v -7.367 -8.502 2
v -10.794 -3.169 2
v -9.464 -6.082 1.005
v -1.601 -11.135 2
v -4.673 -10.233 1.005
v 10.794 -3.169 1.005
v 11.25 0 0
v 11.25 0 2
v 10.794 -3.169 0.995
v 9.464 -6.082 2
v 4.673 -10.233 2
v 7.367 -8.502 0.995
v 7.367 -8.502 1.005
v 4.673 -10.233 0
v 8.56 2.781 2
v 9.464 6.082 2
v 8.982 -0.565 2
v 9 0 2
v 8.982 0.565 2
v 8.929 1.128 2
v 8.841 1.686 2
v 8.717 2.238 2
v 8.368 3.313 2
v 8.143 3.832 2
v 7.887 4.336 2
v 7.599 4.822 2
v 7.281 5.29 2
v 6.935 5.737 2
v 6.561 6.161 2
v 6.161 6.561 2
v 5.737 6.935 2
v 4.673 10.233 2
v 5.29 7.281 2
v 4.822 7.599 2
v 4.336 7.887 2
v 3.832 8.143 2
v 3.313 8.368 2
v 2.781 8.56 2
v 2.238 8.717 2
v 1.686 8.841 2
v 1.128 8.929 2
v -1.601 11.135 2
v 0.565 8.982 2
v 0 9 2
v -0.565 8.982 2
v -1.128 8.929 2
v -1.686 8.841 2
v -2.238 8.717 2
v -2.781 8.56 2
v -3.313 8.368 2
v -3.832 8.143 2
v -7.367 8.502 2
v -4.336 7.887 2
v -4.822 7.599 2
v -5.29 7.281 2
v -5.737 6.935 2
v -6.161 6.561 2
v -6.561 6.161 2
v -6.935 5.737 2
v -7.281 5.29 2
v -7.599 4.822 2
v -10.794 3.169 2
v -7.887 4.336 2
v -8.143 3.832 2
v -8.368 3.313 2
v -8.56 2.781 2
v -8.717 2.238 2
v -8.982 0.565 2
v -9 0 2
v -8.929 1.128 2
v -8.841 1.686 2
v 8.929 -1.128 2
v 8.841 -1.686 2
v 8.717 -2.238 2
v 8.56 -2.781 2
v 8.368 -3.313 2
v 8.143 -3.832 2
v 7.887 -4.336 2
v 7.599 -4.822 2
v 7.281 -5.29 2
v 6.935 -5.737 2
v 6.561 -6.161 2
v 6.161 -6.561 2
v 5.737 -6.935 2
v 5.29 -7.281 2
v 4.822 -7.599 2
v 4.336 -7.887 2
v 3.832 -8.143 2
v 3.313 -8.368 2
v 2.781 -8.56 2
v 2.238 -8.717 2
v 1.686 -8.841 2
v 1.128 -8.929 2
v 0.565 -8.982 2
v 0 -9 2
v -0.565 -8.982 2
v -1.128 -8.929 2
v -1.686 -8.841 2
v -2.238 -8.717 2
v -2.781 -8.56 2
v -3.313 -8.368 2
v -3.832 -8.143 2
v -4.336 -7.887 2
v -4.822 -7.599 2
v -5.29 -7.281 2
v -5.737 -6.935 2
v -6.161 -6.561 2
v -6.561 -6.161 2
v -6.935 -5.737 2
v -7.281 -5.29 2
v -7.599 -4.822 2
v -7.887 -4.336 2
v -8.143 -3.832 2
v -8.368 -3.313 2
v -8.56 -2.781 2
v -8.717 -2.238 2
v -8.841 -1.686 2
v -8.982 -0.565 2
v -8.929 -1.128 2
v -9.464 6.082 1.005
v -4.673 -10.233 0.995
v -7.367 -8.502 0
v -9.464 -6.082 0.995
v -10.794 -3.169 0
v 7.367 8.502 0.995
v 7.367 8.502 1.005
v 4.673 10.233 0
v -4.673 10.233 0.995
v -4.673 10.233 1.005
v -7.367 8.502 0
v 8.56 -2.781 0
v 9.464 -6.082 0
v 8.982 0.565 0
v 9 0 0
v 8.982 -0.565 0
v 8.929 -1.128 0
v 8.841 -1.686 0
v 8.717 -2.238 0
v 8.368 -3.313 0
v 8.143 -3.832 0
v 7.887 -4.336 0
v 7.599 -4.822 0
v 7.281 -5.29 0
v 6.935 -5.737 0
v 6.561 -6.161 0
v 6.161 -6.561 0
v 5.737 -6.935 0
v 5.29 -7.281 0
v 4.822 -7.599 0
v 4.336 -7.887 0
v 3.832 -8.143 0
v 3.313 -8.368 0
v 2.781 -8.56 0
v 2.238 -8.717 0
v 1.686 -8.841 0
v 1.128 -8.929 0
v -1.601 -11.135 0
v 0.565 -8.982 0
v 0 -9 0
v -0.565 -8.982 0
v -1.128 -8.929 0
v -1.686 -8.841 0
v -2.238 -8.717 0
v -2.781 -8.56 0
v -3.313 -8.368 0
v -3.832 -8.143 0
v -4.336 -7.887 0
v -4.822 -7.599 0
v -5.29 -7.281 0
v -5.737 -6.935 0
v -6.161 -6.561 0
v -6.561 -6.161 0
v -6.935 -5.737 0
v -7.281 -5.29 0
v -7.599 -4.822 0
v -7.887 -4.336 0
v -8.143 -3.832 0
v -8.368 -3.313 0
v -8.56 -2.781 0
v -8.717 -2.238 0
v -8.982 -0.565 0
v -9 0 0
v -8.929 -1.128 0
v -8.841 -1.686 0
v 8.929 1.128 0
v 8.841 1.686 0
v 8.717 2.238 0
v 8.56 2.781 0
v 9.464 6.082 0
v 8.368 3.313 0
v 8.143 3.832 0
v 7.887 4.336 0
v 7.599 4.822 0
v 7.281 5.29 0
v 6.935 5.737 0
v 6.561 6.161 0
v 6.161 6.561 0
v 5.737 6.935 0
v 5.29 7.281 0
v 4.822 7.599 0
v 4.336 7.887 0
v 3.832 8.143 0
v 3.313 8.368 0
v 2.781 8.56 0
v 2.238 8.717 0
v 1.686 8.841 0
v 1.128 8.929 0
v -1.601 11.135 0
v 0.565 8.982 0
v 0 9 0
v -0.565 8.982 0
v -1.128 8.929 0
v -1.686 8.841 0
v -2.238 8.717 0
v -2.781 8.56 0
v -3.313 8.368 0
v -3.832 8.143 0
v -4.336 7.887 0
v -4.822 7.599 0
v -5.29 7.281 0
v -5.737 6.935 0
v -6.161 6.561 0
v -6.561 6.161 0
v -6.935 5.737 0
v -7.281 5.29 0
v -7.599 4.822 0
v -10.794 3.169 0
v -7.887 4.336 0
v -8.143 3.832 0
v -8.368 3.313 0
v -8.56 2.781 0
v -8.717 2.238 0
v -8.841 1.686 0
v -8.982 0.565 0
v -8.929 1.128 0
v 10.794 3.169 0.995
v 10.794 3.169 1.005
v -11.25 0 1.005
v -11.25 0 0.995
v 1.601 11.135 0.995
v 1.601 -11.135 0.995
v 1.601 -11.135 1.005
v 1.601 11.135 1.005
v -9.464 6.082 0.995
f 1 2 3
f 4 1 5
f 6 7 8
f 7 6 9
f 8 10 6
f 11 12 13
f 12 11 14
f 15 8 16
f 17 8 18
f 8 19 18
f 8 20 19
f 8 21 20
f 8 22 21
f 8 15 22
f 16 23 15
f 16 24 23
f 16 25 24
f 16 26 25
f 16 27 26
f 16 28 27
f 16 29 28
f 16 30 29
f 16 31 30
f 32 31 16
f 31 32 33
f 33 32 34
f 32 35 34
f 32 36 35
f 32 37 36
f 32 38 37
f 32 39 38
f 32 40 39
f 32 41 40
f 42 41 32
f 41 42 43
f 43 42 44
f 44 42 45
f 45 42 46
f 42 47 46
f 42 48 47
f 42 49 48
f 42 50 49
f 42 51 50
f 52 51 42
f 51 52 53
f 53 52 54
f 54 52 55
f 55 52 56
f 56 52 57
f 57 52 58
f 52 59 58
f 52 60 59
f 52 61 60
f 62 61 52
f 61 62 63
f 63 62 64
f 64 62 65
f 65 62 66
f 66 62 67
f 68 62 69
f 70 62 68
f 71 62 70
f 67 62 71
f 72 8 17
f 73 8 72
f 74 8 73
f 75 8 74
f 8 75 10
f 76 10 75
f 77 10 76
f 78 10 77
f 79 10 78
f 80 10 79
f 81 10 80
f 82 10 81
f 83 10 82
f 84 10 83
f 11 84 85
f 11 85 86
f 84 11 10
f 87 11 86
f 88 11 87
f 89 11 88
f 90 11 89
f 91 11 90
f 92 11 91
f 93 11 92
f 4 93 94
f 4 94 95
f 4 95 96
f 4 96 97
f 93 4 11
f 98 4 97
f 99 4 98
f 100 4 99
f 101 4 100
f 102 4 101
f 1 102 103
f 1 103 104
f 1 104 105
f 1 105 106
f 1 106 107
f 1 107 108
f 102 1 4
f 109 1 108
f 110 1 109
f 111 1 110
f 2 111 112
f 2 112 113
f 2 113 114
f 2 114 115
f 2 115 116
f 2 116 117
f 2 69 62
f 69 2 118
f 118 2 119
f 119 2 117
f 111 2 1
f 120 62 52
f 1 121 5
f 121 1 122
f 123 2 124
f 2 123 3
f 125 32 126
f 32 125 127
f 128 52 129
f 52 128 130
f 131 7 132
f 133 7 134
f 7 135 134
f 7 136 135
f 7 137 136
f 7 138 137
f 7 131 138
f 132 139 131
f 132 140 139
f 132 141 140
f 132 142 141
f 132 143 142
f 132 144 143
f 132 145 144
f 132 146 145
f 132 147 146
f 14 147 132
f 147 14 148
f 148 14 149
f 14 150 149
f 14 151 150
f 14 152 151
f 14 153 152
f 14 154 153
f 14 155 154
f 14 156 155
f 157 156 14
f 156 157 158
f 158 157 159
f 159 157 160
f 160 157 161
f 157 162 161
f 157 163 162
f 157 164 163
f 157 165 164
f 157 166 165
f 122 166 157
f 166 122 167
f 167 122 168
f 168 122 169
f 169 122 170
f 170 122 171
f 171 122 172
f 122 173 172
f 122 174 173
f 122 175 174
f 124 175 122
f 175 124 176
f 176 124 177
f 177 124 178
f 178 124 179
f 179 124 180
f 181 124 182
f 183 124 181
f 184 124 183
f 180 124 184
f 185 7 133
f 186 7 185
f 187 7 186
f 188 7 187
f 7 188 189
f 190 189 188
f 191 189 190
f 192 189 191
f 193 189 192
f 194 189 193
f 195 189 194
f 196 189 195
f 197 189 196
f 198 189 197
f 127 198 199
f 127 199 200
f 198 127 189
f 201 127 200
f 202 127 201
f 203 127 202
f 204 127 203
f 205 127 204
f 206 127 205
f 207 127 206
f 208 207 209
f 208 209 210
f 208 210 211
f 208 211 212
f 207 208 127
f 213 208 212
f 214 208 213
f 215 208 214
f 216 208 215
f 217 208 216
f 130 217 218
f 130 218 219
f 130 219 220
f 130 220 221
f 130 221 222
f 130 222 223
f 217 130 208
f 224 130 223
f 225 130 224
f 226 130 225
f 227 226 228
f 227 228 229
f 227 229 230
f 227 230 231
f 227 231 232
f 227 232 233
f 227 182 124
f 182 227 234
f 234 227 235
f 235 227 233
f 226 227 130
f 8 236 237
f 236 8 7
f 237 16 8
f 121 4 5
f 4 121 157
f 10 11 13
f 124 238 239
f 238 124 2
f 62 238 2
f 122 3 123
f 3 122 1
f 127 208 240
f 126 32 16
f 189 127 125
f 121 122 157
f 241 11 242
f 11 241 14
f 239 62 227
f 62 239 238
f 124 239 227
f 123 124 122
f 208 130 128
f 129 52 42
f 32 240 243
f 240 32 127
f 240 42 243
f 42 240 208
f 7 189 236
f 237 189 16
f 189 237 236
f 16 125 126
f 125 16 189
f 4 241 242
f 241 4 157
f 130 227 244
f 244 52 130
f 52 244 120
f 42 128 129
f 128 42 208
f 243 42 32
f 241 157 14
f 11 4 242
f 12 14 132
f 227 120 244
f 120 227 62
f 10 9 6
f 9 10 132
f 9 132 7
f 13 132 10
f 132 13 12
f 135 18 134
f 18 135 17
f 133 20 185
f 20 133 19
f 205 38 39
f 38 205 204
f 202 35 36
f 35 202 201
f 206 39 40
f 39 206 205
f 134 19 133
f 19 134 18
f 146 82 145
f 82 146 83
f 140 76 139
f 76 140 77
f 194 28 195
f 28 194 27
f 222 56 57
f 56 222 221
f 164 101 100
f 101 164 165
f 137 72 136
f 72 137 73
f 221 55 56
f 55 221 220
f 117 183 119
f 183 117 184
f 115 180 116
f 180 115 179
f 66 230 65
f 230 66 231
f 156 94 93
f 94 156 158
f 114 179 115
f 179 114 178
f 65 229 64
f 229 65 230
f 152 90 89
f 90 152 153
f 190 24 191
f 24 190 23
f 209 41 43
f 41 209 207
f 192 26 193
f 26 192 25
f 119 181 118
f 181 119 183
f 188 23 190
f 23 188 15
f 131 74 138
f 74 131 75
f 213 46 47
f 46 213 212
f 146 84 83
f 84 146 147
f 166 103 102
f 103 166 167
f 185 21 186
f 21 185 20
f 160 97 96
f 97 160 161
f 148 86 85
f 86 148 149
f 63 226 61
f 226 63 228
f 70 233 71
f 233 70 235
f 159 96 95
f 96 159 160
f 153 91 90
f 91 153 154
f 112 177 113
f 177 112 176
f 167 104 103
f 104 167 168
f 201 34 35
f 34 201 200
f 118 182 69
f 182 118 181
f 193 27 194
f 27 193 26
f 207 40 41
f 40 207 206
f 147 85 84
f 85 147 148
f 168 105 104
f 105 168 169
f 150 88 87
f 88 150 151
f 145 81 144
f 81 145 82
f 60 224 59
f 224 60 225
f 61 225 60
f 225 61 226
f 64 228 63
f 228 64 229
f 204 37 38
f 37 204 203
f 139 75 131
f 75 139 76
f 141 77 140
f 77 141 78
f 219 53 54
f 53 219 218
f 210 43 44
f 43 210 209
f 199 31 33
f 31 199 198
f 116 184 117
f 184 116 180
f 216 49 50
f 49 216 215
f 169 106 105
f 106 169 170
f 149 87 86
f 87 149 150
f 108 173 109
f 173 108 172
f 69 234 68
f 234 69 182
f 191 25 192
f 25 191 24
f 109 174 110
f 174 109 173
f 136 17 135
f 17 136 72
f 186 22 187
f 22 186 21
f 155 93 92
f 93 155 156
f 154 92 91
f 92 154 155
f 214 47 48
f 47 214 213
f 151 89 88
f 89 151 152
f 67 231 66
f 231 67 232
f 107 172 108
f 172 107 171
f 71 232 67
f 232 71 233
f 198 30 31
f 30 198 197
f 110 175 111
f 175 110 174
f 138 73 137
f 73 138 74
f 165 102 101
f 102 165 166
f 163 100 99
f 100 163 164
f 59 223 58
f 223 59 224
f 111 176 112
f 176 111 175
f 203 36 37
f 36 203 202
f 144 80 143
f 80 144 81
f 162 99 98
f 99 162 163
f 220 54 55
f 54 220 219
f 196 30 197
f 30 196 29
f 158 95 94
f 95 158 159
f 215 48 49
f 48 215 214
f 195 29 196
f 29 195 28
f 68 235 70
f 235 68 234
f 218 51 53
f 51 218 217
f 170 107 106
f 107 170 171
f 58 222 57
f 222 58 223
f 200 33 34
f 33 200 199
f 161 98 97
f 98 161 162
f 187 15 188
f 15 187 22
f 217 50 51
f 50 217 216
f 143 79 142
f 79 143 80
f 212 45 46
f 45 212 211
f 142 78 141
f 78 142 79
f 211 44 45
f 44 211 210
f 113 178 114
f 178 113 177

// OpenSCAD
// your finger measurement
inner_diameter = 18;
inner_radius = inner_diameter / 2;

// how much bigger should the outside be?
//
// useful values: +10% .. +20% 
//
// (inversely proportionate to the facets: facets = 6 --> 20%, facets = 24 --> 10%)
radius = inner_radius * 1.25;

// the total number of similar rows that the ring should consist of
//
// useful values: 1 ... 5
number_of_rows = 1;

// the height of each layer
//
// useful values: 1 ... 5
height = 2;

// how many points thingies around the ring do you want?
//
// useful values: 6 .. 12 .. 24
facets = 11;

// height of the middle layer... 
// nearly zero results in a single diamond shape
// a value closer to one third of the height gives a nice segmented look
//
// useful values: 0.01 ... 0.2*height ... 0.8*height
middle_height = 0.01;//*height;
//middle_height = 0.3*height;

// make the pointy thingies a little larger for a more 3d-look
//
// useful values: 0 .. 0.25 .. 0.5
//
plus_radius = 0;
//plus_radius = 0.15;
//plus_radius = 0.25;
//plus_radius = 0.50;


// subtract the inner hole from the final result
difference()
{
    // iterate through the rows
    for(i = [0:number_of_rows-1])
    {
        // move the just created part to it's final position
        translate([0,0,i*height])
        
        // calculate the hull over the three parts of each layer
        hull()
        {
            // first layer
            translate([0, 0, 0])
            linear_extrude(height=height/3)
            circle(r = radius-plus_radius, $fn = facets);

            // second rotated THIN layer
            translate([0, 0, 0.5 * height - middle_height/2]) 
            linear_extrude(height=middle_height)
            rotate([0,0,360/facets/2])
            circle(r = radius+plus_radius, $fn = facets);
           
            // third layer
            translate([0,0, 2/3 * height]) 
            linear_extrude(height=height/3)
            circle(r = radius-plus_radius, $fn = facets);
         }
    }

    // inner circle to be deleted
    $fn = 100;
    linear_extrude(height=100, center=true)
    circle(r = inner_radius);
   
}
